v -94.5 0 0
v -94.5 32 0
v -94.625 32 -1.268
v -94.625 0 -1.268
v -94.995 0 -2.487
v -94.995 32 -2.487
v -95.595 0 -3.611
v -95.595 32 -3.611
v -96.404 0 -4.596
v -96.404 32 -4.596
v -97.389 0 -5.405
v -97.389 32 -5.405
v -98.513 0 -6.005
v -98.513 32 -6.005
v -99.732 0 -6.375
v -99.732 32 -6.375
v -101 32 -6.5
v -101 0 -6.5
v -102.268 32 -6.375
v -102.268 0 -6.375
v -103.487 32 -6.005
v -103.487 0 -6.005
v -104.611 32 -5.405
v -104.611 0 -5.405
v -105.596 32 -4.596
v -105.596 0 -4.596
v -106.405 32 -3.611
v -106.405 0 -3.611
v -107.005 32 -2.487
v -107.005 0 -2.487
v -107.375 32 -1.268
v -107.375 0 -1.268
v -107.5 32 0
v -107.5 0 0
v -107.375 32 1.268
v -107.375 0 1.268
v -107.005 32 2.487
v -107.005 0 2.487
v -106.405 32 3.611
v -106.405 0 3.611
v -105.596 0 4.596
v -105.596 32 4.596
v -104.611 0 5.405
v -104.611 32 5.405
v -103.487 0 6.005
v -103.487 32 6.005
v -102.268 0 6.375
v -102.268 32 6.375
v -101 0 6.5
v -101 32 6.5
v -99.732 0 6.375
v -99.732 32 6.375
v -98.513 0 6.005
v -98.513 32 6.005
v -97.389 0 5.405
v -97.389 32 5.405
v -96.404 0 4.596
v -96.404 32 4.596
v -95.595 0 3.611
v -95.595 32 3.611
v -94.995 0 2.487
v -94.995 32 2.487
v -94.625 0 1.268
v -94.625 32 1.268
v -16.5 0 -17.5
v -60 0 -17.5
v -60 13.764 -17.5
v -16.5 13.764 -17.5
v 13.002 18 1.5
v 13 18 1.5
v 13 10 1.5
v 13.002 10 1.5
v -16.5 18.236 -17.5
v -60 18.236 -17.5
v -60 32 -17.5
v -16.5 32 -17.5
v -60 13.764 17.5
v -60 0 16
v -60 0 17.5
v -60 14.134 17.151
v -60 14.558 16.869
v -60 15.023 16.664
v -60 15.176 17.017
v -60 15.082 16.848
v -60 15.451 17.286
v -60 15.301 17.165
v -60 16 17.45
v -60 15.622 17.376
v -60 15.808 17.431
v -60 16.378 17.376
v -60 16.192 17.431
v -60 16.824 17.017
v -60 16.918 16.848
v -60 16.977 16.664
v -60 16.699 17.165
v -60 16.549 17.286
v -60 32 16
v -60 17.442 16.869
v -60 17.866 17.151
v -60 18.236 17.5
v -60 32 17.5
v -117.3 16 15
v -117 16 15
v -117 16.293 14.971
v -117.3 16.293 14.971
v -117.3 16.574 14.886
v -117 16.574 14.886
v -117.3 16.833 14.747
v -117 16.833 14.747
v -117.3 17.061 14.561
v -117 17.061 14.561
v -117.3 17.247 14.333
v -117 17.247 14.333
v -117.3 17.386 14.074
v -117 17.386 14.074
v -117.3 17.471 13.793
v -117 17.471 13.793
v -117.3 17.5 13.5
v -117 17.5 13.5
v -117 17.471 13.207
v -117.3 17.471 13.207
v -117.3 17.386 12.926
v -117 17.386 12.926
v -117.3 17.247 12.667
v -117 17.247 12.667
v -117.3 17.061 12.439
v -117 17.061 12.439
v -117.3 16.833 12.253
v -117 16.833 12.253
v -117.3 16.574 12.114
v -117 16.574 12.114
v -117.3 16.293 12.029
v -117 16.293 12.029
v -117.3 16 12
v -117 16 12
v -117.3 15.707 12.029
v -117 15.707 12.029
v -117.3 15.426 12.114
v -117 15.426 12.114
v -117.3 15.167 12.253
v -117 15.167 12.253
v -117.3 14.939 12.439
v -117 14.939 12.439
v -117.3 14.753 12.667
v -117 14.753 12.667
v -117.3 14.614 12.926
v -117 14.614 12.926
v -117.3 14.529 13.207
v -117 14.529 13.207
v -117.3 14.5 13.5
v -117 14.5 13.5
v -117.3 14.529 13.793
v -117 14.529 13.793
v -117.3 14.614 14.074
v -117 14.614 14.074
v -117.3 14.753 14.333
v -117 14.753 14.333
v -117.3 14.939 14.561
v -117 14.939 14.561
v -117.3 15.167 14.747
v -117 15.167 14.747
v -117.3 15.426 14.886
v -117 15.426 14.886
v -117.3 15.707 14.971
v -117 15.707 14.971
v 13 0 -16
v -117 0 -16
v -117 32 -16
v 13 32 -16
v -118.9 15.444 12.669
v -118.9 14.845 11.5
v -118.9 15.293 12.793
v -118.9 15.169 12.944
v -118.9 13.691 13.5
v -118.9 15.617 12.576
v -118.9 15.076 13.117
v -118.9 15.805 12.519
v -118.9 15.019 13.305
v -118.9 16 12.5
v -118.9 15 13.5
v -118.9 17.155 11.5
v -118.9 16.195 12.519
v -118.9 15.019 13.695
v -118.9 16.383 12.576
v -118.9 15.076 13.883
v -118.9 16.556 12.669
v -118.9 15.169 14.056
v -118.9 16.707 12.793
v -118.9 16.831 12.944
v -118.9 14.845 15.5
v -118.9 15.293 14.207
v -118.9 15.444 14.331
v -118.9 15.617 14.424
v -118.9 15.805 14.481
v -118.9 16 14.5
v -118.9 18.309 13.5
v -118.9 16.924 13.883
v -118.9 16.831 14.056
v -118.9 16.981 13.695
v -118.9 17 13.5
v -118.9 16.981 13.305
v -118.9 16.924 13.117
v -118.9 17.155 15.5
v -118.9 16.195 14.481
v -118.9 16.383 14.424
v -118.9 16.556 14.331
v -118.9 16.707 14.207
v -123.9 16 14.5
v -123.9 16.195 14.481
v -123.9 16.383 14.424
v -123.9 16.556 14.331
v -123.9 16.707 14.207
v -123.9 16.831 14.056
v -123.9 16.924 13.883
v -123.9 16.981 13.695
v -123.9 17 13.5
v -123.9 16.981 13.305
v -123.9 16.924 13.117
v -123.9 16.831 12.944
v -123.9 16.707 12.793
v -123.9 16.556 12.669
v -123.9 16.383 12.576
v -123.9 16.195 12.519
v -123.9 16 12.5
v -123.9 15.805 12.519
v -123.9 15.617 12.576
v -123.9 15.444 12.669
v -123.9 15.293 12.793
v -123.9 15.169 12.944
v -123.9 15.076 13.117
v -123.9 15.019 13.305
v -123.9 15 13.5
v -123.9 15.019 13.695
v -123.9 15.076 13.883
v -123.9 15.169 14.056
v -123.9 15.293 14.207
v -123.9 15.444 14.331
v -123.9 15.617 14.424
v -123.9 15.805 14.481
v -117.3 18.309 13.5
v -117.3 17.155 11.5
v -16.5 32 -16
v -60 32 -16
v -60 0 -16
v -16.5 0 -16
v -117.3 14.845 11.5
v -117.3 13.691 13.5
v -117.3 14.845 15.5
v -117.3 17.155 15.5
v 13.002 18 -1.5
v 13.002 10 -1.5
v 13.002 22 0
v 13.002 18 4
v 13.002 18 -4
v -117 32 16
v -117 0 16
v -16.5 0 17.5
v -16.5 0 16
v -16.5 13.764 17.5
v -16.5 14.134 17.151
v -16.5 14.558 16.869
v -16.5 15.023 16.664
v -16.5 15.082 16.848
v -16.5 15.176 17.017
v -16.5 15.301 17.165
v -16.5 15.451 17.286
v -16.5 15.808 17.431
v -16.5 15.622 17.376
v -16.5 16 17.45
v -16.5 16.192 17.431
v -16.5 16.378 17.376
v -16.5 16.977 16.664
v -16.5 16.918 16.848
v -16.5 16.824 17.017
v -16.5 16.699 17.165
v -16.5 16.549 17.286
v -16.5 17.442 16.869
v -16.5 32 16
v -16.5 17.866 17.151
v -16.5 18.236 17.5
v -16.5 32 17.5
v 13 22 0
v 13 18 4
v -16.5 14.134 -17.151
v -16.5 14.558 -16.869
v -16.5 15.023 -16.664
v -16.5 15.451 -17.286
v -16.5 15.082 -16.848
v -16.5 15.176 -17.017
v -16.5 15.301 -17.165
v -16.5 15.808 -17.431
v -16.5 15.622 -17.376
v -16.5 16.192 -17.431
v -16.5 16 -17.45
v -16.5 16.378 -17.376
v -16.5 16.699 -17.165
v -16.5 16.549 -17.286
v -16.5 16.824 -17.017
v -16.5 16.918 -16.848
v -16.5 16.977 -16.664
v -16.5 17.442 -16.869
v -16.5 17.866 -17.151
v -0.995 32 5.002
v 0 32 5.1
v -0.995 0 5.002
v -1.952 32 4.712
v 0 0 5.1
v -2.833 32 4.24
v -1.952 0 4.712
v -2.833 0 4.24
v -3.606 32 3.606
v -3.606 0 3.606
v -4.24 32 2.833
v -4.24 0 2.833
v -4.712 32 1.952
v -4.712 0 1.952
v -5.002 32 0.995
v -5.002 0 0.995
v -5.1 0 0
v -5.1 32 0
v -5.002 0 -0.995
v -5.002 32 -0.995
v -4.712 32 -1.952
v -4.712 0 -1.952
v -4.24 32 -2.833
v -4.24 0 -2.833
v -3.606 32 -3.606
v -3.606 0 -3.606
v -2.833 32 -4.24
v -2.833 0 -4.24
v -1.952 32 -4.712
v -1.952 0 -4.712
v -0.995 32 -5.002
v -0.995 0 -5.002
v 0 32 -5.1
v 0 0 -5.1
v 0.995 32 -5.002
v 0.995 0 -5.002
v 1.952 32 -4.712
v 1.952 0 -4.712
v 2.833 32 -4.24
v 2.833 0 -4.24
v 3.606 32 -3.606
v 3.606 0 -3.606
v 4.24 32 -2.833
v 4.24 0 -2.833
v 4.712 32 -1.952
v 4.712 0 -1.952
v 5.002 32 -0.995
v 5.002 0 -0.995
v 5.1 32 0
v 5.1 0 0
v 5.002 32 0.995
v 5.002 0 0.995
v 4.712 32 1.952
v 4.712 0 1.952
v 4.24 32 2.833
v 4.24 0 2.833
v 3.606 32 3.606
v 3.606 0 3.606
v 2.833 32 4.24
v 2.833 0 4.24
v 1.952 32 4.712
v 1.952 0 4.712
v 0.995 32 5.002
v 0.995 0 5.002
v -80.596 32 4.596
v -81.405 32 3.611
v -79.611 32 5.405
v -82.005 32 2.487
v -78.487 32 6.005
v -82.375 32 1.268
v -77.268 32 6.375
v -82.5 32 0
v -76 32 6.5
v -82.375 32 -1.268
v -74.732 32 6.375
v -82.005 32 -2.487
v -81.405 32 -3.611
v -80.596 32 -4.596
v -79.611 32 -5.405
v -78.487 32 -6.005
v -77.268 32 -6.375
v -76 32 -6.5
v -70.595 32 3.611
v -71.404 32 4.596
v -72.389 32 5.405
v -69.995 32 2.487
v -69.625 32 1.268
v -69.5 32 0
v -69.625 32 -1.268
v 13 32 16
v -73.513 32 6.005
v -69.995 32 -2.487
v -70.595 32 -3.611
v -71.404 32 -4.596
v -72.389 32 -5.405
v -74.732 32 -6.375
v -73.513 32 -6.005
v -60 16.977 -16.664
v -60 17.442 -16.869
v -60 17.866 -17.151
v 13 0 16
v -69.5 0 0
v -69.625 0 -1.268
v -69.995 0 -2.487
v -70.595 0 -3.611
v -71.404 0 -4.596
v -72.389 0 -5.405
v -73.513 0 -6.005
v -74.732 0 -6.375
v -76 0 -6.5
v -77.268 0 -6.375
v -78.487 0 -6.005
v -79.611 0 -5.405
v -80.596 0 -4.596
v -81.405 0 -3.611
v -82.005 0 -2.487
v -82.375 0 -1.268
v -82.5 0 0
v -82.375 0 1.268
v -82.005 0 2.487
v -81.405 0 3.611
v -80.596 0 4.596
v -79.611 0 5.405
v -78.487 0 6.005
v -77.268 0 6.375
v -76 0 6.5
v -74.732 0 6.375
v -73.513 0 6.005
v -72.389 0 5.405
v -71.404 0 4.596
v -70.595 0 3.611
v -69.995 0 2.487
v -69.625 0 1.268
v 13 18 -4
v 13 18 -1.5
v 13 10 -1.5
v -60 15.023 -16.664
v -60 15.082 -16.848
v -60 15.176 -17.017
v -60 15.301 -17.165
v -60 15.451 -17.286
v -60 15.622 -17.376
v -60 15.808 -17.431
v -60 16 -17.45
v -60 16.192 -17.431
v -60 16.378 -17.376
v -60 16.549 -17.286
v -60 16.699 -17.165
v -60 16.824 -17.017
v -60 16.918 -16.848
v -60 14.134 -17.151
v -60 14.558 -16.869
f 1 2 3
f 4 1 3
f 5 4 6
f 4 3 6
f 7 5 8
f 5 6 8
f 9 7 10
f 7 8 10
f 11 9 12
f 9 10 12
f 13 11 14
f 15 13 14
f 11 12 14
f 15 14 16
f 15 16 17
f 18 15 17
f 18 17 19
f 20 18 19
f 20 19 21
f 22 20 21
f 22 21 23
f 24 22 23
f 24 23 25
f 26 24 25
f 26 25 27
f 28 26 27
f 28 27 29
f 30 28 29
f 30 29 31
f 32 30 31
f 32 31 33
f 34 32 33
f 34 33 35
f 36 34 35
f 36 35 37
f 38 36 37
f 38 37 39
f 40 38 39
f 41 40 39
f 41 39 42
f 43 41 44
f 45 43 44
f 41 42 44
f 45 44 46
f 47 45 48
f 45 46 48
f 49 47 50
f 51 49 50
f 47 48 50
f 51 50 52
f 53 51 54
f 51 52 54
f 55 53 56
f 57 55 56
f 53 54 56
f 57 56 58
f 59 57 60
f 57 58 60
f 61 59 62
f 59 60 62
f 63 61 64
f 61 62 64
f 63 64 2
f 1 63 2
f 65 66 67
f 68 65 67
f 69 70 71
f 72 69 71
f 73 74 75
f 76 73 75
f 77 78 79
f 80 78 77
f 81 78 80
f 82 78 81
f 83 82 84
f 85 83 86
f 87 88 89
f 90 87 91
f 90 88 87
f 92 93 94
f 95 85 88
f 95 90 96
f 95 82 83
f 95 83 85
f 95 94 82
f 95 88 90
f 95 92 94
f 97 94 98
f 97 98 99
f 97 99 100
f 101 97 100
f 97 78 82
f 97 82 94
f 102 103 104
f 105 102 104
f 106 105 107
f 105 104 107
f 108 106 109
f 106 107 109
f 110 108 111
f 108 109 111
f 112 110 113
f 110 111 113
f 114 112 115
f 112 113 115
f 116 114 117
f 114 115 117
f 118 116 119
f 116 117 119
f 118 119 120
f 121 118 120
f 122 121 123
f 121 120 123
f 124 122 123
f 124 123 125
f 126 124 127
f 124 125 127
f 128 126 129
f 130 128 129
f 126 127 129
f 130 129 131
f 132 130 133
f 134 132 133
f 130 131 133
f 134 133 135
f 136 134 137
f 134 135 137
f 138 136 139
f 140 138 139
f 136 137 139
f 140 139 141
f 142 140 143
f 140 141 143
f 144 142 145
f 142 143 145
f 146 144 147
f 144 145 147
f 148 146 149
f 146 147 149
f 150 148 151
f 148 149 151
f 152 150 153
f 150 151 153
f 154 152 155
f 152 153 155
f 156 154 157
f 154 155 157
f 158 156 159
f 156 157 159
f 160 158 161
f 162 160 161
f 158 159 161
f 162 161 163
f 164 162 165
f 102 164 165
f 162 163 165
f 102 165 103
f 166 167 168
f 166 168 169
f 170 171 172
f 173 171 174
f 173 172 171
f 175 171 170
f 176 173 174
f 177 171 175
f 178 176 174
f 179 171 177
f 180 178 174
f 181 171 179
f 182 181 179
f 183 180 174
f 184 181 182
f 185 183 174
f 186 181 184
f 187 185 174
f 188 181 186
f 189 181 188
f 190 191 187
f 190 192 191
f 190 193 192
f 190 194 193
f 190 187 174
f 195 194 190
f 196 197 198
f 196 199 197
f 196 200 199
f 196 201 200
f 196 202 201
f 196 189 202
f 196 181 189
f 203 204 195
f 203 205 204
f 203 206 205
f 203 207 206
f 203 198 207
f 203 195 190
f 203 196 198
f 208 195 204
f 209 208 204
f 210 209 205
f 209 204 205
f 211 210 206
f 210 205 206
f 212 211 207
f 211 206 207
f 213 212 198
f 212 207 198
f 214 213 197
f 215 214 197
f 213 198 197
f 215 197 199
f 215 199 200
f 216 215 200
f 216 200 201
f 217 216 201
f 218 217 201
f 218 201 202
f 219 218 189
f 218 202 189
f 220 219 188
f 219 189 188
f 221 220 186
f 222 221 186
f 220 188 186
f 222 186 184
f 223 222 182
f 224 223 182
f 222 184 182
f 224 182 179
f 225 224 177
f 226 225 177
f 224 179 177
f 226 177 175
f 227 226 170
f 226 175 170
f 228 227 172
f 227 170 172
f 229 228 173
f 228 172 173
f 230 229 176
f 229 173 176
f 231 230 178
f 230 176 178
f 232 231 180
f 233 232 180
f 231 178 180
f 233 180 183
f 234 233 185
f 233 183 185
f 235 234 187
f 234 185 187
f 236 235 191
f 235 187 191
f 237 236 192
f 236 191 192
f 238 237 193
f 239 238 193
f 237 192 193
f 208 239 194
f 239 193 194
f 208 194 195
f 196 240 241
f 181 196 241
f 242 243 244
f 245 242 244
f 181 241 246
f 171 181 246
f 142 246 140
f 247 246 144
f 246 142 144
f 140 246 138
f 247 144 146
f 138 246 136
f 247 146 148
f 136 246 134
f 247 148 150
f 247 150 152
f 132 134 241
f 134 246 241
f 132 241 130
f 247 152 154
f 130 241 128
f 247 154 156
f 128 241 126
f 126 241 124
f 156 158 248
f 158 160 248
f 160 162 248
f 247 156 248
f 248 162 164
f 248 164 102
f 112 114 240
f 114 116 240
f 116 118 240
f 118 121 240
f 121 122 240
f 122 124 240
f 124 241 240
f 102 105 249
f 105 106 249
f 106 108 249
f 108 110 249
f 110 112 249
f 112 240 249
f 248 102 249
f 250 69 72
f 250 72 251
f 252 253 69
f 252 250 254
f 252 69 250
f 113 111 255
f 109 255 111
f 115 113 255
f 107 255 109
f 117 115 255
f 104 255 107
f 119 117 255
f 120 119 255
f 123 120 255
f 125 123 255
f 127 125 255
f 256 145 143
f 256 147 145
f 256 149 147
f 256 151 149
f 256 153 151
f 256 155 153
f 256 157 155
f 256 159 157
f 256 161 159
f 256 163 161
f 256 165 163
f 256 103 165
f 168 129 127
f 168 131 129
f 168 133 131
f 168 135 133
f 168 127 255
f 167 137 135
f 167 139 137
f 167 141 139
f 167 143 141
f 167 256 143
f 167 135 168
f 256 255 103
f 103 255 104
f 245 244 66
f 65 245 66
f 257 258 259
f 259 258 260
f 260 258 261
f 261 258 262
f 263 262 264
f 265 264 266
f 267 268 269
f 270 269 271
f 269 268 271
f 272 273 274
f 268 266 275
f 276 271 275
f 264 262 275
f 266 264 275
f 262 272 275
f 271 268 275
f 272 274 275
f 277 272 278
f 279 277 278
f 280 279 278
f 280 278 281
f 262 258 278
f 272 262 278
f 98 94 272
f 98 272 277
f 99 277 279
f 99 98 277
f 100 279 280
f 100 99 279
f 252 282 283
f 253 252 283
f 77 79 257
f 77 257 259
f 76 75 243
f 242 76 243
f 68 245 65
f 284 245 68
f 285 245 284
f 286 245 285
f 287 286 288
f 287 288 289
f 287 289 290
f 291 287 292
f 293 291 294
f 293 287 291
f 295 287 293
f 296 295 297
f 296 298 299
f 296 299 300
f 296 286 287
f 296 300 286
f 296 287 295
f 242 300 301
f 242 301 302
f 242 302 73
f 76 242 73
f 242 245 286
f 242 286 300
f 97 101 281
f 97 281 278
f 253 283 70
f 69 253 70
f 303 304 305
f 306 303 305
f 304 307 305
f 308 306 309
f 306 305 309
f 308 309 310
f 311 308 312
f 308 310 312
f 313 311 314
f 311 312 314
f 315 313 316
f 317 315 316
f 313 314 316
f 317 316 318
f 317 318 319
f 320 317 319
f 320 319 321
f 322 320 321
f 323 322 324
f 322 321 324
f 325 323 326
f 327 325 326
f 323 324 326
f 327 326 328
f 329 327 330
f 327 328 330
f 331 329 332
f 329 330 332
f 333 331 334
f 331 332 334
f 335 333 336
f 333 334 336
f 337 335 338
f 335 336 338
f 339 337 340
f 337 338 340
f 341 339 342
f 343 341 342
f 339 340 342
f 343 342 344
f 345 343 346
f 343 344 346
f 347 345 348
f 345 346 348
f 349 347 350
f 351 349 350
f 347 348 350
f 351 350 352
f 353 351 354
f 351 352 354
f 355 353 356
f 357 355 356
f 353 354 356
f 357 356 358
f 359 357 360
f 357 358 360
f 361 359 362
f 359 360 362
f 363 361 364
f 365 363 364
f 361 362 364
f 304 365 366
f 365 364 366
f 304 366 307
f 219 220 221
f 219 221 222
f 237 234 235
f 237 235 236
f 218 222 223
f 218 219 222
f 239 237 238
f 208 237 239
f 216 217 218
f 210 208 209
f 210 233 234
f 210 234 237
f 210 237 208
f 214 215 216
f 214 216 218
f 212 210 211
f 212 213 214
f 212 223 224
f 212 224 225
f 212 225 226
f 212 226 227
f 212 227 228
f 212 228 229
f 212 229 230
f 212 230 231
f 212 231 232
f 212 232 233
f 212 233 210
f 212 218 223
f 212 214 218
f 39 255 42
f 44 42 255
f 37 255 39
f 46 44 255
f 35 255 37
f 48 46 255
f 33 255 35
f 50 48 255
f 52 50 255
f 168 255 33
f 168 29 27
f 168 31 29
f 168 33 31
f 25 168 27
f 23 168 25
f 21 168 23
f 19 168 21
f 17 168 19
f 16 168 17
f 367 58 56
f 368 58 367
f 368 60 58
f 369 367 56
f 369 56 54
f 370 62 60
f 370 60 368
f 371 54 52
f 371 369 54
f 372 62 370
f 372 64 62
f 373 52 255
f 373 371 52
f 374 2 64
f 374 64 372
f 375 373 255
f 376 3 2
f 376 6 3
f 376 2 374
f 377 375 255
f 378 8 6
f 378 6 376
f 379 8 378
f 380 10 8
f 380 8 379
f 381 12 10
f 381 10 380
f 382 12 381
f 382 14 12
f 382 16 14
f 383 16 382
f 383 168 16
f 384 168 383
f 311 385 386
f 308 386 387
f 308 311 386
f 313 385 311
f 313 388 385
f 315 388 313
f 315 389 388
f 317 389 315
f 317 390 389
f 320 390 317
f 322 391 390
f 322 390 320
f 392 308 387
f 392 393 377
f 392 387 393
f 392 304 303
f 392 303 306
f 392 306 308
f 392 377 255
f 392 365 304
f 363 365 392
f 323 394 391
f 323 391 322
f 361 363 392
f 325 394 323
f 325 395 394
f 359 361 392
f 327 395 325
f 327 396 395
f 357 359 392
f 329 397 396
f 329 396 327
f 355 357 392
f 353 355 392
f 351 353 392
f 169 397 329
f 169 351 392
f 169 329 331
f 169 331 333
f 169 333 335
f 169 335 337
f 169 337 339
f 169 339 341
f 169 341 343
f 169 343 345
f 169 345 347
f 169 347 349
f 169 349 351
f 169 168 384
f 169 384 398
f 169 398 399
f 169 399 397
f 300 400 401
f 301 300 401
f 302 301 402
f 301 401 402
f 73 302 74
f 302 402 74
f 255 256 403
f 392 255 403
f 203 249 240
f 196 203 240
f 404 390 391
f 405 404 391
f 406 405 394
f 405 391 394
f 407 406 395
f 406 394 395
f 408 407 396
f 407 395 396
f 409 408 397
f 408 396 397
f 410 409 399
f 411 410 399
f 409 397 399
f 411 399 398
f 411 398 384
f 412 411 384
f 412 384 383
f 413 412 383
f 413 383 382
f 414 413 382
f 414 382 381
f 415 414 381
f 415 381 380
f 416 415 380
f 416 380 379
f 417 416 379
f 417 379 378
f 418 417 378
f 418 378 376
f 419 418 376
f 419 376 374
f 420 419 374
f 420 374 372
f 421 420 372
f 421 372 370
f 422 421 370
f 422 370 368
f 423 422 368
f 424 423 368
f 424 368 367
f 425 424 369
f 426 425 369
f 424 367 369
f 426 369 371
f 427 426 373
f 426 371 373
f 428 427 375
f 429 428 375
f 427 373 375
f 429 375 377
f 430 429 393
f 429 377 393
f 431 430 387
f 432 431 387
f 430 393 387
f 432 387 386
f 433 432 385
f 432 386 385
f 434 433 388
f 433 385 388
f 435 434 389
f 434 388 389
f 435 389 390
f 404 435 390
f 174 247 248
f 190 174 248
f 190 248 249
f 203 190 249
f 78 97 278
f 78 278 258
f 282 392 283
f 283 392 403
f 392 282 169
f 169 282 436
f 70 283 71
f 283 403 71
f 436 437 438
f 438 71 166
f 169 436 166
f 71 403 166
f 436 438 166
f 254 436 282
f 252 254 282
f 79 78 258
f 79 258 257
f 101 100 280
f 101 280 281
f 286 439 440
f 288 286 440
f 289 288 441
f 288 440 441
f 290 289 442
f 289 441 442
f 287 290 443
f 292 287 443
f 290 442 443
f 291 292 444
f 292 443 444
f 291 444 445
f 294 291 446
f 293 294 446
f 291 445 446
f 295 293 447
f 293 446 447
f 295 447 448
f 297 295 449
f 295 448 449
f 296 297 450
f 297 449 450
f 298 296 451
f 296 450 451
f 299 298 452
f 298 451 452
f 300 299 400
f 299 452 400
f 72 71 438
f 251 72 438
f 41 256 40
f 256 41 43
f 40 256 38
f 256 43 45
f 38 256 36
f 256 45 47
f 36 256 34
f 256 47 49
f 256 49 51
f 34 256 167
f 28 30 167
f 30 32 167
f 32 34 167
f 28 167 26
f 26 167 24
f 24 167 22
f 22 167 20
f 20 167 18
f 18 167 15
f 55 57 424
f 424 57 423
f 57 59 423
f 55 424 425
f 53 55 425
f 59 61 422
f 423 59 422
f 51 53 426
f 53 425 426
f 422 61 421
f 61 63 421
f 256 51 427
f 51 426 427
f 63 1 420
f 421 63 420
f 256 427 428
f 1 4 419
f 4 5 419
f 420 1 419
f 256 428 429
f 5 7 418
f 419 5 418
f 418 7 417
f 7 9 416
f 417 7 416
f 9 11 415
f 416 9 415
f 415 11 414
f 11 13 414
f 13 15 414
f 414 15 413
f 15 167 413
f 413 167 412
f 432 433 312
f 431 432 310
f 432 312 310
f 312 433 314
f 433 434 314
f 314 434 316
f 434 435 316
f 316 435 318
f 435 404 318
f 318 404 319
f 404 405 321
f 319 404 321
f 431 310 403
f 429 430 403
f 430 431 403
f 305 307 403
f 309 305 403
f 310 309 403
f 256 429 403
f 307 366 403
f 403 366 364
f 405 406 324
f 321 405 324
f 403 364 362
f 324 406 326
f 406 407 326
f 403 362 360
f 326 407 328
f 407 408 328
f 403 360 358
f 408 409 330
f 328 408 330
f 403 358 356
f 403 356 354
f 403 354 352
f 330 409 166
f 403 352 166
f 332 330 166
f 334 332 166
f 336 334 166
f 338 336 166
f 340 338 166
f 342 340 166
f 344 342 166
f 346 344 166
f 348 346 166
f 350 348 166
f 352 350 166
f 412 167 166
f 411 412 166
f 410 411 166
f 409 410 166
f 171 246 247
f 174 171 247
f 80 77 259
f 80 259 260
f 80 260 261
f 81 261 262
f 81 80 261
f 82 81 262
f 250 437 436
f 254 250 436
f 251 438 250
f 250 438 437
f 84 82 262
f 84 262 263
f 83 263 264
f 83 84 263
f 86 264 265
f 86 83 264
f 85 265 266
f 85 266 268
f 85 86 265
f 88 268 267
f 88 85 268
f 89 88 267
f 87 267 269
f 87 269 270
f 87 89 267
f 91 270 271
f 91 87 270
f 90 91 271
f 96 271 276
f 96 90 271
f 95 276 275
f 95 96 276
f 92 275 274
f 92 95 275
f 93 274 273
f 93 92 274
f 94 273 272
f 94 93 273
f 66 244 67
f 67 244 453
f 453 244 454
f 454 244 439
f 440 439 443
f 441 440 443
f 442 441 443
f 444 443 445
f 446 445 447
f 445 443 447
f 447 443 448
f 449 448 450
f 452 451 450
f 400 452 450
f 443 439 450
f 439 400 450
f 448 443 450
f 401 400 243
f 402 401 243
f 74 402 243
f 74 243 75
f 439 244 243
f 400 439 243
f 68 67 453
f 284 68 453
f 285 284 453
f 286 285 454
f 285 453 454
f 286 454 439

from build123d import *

# Parameters (mm, degrees)
SKETCH_1_W          = 130
SKETCH_1_H          = 32
EXTRUDE_1_DEPTH     = 32
EXTRUDE_START       = -57
EXTRUDE_2_DEPTH     = 43.5
EXTRUDE_2_2_DEPTH   = 43.5
SKETCH_3_R          = 6.5
CUT_EXTRUDE_3_DEPTH = 33
SKETCH_4_W          = 5.1
SKETCH_4_H          = 32
SKETCH_6_R          = 1.5
EXTRUDE_4_DEPTH     = 0.3
EXTRUDE_5_DEPTH     = 1.6
SKETCH_8_R          = 1
EXTRUDE_6_DEPTH     = 5
EXTRUDE_8_DEPTH     = 0.002


with BuildPart() as part:
    # Эскиз1 → Вытянуть1 (new body)
    with BuildSketch(Plane(origin=(0, 0, 0), x_dir=(1, 0, 0), z_dir=(0, 1, 0))):
        with Locations((-52, 0)):
            Rectangle(SKETCH_1_W, SKETCH_1_H)
    extrude(amount=EXTRUDE_1_DEPTH)

    # Эскиз3 → Вытянуть3 (cut, through all)
    with BuildSketch(Plane(origin=(0, 32, 0), x_dir=(1, 0, 0), z_dir=(0, 1, 0))):
        with Locations((-101, 0)):
            Circle(SKETCH_3_R)
        with Locations((-76, 0)):
            Circle(SKETCH_3_R)
    extrude(amount=-CUT_EXTRUDE_3_DEPTH, mode=Mode.SUBTRACT)

    # Эскиз4 → Отверстие обработанное метчиком M12x1.751 (revolve, cut)
    with BuildSketch(Plane(origin=(0, 32, 0), x_dir=(0, 0, 1), z_dir=(1, 0, 0))):
        with Locations((2.55, 16)):
            Rectangle(SKETCH_4_W, SKETCH_4_H)
    revolve(axis=Axis((0, 38.35, 0), (0, -1, 0)), mode=Mode.SUBTRACT)

    # Эскиз6 → Вытянуть4 (add)
    with BuildSketch(Plane.ZY.offset(117)):
        with Locations((13.5, 16)):
            Circle(SKETCH_6_R)
    extrude(amount=EXTRUDE_4_DEPTH)

    # Эскиз7 → Вытянуть5 (add)
    with BuildSketch(Plane.ZY.offset(117.3)):
        Polygon((13.5, 18.309401077), (11.5, 17.154700538), (11.5, 14.845299462), (13.5, 13.690598923), (15.5, 14.845299462), (15.5, 17.154700538), align=None)
    extrude(amount=EXTRUDE_5_DEPTH)

    # Эскиз8 → Вытянуть6 (add)
    with BuildSketch(Plane.ZY.offset(118.9)):
        with Locations((13.5, 16)):
            Circle(SKETCH_8_R)
    extrude(amount=EXTRUDE_6_DEPTH)

    # Эскиз10 → Вытянуть8 (add)
    with BuildSketch(Plane(origin=(13, 0, 0), x_dir=(0, 0, -1), z_dir=(1, 0, 0))):
        Polygon((0, 22), (-4, 18), (-1.5, 18), (-1.5, 10), (1.5, 10), (1.5, 18), (4, 18), align=None)
    extrude(amount=EXTRUDE_8_DEPTH)


with BuildPart() as body_2:
    # Эскиз2 → Вытянуть2 (new body)
    with BuildSketch(Plane.ZY.offset(117).offset(EXTRUDE_START)):
        with BuildLine():
            Line((-16, 0), (-17.5, 0))
            Line((-17.5, 0), (-17.5, 13.763932023))
            ThreePointArc((-17.5, 13.763932023), (-17.001155093, 14.339947551), (-16.66352459, 15.02306231))
            ThreePointArc((-16.66352459, 15.02306231), (-17.45, 16), (-16.66352459, 16.97693769))
            ThreePointArc((-16.66352459, 16.97693769), (-17.001155093, 17.660052449), (-17.5, 18.236067977))
            Line((-17.5, 18.236067977), (-17.5, 32))
            Line((-17.5, 32), (-16, 32))
            Line((-16, 32), (-16, 0))
        make_face()
    extrude(amount=-EXTRUDE_2_DEPTH)


with BuildPart() as body_3:
    # Эскиз2 → Extrude 2 2 (new body)
    with BuildSketch(Plane.ZY.offset(117).offset(EXTRUDE_START)):
        with BuildLine():
            Line((17.5, 18.236067977), (17.5, 32))
            Line((17.5, 32), (16, 32))
            Line((16, 32), (16, 0))
            Line((16, 0), (17.5, 0))
            Line((17.5, 0), (17.5, 13.763932023))
            ThreePointArc((17.5, 13.763932023), (17.001155093, 14.339947551), (16.66352459, 15.02306231))
            ThreePointArc((16.66352459, 15.02306231), (17.45, 16), (16.66352459, 16.97693769))
            ThreePointArc((16.66352459, 16.97693769), (17.001155093, 17.660052449), (17.5, 18.236067977))
        make_face()
    extrude(amount=-EXTRUDE_2_2_DEPTH)


solid = Compound([part.part, body_2.part, body_3.part])
